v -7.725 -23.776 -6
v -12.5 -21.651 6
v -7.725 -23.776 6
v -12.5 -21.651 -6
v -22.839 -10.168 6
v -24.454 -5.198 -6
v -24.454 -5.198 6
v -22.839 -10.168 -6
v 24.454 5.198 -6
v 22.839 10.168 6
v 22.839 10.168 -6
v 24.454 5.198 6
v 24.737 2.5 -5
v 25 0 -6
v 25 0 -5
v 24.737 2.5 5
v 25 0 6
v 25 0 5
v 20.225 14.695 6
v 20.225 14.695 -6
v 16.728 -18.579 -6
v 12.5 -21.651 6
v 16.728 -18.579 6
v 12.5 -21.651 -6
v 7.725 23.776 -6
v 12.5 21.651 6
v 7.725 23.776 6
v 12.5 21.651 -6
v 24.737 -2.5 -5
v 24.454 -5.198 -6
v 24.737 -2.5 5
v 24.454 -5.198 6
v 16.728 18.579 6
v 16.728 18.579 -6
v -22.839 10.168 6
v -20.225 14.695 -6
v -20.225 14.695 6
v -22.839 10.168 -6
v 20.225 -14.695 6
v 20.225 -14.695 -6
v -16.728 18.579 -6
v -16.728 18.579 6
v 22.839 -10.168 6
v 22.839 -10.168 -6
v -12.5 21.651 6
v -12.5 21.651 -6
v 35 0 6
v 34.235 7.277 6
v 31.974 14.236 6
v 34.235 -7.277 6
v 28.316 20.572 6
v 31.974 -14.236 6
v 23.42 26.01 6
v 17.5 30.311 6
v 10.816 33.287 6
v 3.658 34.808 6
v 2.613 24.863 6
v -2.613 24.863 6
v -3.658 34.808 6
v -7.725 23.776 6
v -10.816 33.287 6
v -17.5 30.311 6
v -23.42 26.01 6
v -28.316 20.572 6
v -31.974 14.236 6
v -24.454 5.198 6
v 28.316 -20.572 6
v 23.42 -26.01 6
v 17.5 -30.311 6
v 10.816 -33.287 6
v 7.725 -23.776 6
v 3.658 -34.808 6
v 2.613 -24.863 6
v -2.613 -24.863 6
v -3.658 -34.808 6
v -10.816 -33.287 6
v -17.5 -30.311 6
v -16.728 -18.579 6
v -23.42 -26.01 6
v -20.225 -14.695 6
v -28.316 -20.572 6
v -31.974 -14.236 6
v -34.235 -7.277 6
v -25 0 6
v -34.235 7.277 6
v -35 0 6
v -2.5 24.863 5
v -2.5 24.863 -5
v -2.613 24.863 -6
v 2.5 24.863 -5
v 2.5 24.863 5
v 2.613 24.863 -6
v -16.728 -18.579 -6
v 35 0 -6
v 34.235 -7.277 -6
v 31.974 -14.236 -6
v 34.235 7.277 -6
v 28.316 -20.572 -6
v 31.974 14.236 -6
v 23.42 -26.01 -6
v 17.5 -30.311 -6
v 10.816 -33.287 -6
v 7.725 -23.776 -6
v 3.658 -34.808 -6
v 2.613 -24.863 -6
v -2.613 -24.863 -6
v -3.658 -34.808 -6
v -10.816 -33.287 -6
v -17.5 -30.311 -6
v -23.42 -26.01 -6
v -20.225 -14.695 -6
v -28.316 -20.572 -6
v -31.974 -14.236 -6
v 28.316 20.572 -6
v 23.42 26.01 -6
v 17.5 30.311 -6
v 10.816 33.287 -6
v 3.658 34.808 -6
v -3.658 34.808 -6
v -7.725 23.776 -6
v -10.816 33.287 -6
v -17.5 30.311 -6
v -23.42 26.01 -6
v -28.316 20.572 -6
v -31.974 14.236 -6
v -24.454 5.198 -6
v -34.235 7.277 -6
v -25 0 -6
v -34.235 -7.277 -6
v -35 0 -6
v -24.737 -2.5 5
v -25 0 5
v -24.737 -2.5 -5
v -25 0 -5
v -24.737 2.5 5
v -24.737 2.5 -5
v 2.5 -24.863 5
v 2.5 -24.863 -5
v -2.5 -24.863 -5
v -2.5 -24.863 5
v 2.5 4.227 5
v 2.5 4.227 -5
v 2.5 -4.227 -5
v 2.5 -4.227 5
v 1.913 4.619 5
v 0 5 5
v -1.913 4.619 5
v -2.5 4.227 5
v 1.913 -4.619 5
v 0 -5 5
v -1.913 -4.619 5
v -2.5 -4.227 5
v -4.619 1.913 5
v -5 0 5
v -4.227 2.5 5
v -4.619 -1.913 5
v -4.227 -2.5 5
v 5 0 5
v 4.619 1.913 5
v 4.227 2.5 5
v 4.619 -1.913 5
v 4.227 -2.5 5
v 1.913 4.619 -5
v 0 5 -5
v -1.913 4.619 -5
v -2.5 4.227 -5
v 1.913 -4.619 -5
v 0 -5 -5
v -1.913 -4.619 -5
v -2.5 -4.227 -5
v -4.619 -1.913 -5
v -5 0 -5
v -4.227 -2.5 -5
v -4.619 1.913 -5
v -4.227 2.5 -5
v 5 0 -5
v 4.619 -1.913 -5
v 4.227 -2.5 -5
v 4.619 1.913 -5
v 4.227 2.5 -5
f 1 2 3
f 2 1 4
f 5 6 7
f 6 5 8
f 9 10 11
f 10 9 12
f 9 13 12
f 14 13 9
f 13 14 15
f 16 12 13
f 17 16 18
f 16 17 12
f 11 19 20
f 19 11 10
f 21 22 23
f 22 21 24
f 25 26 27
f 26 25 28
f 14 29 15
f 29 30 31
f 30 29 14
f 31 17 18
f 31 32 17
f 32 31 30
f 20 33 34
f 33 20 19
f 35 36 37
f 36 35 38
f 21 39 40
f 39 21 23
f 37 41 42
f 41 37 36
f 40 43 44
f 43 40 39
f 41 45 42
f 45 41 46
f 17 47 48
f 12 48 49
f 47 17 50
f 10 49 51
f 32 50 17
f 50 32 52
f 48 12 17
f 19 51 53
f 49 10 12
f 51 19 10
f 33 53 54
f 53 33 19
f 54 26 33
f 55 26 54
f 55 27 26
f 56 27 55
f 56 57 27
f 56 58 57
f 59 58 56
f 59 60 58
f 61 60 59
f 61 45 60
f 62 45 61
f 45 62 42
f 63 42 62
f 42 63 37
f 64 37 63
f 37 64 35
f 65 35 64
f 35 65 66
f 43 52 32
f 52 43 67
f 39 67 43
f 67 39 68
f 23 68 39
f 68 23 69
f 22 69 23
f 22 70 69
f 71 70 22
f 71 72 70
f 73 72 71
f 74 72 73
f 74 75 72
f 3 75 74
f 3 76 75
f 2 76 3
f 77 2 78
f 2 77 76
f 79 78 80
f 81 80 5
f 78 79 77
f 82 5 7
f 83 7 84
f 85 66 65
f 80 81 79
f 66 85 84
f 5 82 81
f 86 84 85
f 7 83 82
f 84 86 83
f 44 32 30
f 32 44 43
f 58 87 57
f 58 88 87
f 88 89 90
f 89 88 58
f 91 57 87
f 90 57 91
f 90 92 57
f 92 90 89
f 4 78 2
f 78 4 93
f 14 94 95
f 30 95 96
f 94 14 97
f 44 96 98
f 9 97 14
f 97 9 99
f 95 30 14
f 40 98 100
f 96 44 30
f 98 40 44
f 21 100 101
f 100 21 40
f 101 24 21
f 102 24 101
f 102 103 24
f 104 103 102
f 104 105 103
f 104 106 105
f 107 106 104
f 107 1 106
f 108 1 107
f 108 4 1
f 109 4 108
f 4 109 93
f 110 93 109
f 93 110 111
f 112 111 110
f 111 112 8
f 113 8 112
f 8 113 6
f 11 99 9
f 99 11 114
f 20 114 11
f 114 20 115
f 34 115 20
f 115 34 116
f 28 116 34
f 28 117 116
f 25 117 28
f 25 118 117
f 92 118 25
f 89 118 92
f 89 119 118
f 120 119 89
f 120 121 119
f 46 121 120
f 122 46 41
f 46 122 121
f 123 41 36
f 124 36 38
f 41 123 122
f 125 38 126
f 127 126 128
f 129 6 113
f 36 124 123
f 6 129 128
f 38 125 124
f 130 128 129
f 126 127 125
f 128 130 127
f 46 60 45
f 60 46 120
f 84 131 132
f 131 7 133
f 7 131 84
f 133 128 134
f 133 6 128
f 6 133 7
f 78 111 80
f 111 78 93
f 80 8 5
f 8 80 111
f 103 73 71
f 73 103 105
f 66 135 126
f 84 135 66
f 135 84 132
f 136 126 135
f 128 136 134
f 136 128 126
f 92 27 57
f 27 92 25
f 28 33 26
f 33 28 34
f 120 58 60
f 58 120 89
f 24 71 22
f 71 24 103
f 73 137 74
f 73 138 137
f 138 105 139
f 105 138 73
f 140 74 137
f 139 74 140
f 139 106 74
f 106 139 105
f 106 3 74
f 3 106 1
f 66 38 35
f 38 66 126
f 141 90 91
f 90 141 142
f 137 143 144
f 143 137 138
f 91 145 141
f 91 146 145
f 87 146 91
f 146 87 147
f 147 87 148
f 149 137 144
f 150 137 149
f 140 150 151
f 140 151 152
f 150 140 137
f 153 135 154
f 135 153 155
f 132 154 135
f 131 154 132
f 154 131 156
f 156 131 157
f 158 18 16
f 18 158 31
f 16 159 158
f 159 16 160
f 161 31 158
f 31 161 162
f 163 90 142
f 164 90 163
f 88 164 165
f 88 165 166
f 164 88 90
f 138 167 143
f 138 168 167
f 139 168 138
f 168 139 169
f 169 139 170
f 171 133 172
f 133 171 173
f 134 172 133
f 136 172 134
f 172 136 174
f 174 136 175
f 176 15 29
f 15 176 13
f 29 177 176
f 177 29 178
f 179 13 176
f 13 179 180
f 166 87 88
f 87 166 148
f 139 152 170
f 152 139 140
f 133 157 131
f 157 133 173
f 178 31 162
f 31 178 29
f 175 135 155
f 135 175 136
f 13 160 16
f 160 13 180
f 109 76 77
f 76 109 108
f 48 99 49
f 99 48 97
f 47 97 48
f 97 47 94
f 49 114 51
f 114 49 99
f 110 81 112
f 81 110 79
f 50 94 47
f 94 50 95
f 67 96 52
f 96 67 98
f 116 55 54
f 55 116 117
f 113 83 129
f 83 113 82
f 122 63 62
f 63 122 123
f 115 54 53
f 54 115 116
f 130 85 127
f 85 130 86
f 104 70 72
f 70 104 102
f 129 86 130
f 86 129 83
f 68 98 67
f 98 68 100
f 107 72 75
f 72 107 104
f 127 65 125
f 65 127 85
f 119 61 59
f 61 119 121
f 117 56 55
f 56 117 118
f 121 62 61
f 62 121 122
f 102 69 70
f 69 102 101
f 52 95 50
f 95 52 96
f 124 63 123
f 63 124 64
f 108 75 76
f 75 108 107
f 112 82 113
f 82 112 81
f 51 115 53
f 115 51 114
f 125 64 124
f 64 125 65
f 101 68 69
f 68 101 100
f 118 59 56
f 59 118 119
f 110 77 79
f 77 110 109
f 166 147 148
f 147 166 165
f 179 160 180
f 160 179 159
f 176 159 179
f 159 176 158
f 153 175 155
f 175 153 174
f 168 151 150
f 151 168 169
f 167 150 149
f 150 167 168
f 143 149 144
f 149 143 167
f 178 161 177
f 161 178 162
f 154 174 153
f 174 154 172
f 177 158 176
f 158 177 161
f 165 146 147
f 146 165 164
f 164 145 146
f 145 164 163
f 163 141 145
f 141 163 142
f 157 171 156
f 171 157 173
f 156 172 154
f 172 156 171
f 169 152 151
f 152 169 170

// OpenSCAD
hudiameter=20;
shaftdiameter=10;
wheeldiameter=70;

difference(){
    cylinder(h=12,d=wheeldiameter, center=true);
difference(){
    cylinder(h=12,d=50, center=true);
    cube([5,50,10],center=true);
    rotate([0,0,90])
    cube([5,50,10],center=true);
}
cylinder(h=12,d=10,center=true);
}

difference(){
    cylinder(h=10,d=hudiameter,center=true);
    cylinder(h=10,d=wheeldiameter,center=true);
  
    }
